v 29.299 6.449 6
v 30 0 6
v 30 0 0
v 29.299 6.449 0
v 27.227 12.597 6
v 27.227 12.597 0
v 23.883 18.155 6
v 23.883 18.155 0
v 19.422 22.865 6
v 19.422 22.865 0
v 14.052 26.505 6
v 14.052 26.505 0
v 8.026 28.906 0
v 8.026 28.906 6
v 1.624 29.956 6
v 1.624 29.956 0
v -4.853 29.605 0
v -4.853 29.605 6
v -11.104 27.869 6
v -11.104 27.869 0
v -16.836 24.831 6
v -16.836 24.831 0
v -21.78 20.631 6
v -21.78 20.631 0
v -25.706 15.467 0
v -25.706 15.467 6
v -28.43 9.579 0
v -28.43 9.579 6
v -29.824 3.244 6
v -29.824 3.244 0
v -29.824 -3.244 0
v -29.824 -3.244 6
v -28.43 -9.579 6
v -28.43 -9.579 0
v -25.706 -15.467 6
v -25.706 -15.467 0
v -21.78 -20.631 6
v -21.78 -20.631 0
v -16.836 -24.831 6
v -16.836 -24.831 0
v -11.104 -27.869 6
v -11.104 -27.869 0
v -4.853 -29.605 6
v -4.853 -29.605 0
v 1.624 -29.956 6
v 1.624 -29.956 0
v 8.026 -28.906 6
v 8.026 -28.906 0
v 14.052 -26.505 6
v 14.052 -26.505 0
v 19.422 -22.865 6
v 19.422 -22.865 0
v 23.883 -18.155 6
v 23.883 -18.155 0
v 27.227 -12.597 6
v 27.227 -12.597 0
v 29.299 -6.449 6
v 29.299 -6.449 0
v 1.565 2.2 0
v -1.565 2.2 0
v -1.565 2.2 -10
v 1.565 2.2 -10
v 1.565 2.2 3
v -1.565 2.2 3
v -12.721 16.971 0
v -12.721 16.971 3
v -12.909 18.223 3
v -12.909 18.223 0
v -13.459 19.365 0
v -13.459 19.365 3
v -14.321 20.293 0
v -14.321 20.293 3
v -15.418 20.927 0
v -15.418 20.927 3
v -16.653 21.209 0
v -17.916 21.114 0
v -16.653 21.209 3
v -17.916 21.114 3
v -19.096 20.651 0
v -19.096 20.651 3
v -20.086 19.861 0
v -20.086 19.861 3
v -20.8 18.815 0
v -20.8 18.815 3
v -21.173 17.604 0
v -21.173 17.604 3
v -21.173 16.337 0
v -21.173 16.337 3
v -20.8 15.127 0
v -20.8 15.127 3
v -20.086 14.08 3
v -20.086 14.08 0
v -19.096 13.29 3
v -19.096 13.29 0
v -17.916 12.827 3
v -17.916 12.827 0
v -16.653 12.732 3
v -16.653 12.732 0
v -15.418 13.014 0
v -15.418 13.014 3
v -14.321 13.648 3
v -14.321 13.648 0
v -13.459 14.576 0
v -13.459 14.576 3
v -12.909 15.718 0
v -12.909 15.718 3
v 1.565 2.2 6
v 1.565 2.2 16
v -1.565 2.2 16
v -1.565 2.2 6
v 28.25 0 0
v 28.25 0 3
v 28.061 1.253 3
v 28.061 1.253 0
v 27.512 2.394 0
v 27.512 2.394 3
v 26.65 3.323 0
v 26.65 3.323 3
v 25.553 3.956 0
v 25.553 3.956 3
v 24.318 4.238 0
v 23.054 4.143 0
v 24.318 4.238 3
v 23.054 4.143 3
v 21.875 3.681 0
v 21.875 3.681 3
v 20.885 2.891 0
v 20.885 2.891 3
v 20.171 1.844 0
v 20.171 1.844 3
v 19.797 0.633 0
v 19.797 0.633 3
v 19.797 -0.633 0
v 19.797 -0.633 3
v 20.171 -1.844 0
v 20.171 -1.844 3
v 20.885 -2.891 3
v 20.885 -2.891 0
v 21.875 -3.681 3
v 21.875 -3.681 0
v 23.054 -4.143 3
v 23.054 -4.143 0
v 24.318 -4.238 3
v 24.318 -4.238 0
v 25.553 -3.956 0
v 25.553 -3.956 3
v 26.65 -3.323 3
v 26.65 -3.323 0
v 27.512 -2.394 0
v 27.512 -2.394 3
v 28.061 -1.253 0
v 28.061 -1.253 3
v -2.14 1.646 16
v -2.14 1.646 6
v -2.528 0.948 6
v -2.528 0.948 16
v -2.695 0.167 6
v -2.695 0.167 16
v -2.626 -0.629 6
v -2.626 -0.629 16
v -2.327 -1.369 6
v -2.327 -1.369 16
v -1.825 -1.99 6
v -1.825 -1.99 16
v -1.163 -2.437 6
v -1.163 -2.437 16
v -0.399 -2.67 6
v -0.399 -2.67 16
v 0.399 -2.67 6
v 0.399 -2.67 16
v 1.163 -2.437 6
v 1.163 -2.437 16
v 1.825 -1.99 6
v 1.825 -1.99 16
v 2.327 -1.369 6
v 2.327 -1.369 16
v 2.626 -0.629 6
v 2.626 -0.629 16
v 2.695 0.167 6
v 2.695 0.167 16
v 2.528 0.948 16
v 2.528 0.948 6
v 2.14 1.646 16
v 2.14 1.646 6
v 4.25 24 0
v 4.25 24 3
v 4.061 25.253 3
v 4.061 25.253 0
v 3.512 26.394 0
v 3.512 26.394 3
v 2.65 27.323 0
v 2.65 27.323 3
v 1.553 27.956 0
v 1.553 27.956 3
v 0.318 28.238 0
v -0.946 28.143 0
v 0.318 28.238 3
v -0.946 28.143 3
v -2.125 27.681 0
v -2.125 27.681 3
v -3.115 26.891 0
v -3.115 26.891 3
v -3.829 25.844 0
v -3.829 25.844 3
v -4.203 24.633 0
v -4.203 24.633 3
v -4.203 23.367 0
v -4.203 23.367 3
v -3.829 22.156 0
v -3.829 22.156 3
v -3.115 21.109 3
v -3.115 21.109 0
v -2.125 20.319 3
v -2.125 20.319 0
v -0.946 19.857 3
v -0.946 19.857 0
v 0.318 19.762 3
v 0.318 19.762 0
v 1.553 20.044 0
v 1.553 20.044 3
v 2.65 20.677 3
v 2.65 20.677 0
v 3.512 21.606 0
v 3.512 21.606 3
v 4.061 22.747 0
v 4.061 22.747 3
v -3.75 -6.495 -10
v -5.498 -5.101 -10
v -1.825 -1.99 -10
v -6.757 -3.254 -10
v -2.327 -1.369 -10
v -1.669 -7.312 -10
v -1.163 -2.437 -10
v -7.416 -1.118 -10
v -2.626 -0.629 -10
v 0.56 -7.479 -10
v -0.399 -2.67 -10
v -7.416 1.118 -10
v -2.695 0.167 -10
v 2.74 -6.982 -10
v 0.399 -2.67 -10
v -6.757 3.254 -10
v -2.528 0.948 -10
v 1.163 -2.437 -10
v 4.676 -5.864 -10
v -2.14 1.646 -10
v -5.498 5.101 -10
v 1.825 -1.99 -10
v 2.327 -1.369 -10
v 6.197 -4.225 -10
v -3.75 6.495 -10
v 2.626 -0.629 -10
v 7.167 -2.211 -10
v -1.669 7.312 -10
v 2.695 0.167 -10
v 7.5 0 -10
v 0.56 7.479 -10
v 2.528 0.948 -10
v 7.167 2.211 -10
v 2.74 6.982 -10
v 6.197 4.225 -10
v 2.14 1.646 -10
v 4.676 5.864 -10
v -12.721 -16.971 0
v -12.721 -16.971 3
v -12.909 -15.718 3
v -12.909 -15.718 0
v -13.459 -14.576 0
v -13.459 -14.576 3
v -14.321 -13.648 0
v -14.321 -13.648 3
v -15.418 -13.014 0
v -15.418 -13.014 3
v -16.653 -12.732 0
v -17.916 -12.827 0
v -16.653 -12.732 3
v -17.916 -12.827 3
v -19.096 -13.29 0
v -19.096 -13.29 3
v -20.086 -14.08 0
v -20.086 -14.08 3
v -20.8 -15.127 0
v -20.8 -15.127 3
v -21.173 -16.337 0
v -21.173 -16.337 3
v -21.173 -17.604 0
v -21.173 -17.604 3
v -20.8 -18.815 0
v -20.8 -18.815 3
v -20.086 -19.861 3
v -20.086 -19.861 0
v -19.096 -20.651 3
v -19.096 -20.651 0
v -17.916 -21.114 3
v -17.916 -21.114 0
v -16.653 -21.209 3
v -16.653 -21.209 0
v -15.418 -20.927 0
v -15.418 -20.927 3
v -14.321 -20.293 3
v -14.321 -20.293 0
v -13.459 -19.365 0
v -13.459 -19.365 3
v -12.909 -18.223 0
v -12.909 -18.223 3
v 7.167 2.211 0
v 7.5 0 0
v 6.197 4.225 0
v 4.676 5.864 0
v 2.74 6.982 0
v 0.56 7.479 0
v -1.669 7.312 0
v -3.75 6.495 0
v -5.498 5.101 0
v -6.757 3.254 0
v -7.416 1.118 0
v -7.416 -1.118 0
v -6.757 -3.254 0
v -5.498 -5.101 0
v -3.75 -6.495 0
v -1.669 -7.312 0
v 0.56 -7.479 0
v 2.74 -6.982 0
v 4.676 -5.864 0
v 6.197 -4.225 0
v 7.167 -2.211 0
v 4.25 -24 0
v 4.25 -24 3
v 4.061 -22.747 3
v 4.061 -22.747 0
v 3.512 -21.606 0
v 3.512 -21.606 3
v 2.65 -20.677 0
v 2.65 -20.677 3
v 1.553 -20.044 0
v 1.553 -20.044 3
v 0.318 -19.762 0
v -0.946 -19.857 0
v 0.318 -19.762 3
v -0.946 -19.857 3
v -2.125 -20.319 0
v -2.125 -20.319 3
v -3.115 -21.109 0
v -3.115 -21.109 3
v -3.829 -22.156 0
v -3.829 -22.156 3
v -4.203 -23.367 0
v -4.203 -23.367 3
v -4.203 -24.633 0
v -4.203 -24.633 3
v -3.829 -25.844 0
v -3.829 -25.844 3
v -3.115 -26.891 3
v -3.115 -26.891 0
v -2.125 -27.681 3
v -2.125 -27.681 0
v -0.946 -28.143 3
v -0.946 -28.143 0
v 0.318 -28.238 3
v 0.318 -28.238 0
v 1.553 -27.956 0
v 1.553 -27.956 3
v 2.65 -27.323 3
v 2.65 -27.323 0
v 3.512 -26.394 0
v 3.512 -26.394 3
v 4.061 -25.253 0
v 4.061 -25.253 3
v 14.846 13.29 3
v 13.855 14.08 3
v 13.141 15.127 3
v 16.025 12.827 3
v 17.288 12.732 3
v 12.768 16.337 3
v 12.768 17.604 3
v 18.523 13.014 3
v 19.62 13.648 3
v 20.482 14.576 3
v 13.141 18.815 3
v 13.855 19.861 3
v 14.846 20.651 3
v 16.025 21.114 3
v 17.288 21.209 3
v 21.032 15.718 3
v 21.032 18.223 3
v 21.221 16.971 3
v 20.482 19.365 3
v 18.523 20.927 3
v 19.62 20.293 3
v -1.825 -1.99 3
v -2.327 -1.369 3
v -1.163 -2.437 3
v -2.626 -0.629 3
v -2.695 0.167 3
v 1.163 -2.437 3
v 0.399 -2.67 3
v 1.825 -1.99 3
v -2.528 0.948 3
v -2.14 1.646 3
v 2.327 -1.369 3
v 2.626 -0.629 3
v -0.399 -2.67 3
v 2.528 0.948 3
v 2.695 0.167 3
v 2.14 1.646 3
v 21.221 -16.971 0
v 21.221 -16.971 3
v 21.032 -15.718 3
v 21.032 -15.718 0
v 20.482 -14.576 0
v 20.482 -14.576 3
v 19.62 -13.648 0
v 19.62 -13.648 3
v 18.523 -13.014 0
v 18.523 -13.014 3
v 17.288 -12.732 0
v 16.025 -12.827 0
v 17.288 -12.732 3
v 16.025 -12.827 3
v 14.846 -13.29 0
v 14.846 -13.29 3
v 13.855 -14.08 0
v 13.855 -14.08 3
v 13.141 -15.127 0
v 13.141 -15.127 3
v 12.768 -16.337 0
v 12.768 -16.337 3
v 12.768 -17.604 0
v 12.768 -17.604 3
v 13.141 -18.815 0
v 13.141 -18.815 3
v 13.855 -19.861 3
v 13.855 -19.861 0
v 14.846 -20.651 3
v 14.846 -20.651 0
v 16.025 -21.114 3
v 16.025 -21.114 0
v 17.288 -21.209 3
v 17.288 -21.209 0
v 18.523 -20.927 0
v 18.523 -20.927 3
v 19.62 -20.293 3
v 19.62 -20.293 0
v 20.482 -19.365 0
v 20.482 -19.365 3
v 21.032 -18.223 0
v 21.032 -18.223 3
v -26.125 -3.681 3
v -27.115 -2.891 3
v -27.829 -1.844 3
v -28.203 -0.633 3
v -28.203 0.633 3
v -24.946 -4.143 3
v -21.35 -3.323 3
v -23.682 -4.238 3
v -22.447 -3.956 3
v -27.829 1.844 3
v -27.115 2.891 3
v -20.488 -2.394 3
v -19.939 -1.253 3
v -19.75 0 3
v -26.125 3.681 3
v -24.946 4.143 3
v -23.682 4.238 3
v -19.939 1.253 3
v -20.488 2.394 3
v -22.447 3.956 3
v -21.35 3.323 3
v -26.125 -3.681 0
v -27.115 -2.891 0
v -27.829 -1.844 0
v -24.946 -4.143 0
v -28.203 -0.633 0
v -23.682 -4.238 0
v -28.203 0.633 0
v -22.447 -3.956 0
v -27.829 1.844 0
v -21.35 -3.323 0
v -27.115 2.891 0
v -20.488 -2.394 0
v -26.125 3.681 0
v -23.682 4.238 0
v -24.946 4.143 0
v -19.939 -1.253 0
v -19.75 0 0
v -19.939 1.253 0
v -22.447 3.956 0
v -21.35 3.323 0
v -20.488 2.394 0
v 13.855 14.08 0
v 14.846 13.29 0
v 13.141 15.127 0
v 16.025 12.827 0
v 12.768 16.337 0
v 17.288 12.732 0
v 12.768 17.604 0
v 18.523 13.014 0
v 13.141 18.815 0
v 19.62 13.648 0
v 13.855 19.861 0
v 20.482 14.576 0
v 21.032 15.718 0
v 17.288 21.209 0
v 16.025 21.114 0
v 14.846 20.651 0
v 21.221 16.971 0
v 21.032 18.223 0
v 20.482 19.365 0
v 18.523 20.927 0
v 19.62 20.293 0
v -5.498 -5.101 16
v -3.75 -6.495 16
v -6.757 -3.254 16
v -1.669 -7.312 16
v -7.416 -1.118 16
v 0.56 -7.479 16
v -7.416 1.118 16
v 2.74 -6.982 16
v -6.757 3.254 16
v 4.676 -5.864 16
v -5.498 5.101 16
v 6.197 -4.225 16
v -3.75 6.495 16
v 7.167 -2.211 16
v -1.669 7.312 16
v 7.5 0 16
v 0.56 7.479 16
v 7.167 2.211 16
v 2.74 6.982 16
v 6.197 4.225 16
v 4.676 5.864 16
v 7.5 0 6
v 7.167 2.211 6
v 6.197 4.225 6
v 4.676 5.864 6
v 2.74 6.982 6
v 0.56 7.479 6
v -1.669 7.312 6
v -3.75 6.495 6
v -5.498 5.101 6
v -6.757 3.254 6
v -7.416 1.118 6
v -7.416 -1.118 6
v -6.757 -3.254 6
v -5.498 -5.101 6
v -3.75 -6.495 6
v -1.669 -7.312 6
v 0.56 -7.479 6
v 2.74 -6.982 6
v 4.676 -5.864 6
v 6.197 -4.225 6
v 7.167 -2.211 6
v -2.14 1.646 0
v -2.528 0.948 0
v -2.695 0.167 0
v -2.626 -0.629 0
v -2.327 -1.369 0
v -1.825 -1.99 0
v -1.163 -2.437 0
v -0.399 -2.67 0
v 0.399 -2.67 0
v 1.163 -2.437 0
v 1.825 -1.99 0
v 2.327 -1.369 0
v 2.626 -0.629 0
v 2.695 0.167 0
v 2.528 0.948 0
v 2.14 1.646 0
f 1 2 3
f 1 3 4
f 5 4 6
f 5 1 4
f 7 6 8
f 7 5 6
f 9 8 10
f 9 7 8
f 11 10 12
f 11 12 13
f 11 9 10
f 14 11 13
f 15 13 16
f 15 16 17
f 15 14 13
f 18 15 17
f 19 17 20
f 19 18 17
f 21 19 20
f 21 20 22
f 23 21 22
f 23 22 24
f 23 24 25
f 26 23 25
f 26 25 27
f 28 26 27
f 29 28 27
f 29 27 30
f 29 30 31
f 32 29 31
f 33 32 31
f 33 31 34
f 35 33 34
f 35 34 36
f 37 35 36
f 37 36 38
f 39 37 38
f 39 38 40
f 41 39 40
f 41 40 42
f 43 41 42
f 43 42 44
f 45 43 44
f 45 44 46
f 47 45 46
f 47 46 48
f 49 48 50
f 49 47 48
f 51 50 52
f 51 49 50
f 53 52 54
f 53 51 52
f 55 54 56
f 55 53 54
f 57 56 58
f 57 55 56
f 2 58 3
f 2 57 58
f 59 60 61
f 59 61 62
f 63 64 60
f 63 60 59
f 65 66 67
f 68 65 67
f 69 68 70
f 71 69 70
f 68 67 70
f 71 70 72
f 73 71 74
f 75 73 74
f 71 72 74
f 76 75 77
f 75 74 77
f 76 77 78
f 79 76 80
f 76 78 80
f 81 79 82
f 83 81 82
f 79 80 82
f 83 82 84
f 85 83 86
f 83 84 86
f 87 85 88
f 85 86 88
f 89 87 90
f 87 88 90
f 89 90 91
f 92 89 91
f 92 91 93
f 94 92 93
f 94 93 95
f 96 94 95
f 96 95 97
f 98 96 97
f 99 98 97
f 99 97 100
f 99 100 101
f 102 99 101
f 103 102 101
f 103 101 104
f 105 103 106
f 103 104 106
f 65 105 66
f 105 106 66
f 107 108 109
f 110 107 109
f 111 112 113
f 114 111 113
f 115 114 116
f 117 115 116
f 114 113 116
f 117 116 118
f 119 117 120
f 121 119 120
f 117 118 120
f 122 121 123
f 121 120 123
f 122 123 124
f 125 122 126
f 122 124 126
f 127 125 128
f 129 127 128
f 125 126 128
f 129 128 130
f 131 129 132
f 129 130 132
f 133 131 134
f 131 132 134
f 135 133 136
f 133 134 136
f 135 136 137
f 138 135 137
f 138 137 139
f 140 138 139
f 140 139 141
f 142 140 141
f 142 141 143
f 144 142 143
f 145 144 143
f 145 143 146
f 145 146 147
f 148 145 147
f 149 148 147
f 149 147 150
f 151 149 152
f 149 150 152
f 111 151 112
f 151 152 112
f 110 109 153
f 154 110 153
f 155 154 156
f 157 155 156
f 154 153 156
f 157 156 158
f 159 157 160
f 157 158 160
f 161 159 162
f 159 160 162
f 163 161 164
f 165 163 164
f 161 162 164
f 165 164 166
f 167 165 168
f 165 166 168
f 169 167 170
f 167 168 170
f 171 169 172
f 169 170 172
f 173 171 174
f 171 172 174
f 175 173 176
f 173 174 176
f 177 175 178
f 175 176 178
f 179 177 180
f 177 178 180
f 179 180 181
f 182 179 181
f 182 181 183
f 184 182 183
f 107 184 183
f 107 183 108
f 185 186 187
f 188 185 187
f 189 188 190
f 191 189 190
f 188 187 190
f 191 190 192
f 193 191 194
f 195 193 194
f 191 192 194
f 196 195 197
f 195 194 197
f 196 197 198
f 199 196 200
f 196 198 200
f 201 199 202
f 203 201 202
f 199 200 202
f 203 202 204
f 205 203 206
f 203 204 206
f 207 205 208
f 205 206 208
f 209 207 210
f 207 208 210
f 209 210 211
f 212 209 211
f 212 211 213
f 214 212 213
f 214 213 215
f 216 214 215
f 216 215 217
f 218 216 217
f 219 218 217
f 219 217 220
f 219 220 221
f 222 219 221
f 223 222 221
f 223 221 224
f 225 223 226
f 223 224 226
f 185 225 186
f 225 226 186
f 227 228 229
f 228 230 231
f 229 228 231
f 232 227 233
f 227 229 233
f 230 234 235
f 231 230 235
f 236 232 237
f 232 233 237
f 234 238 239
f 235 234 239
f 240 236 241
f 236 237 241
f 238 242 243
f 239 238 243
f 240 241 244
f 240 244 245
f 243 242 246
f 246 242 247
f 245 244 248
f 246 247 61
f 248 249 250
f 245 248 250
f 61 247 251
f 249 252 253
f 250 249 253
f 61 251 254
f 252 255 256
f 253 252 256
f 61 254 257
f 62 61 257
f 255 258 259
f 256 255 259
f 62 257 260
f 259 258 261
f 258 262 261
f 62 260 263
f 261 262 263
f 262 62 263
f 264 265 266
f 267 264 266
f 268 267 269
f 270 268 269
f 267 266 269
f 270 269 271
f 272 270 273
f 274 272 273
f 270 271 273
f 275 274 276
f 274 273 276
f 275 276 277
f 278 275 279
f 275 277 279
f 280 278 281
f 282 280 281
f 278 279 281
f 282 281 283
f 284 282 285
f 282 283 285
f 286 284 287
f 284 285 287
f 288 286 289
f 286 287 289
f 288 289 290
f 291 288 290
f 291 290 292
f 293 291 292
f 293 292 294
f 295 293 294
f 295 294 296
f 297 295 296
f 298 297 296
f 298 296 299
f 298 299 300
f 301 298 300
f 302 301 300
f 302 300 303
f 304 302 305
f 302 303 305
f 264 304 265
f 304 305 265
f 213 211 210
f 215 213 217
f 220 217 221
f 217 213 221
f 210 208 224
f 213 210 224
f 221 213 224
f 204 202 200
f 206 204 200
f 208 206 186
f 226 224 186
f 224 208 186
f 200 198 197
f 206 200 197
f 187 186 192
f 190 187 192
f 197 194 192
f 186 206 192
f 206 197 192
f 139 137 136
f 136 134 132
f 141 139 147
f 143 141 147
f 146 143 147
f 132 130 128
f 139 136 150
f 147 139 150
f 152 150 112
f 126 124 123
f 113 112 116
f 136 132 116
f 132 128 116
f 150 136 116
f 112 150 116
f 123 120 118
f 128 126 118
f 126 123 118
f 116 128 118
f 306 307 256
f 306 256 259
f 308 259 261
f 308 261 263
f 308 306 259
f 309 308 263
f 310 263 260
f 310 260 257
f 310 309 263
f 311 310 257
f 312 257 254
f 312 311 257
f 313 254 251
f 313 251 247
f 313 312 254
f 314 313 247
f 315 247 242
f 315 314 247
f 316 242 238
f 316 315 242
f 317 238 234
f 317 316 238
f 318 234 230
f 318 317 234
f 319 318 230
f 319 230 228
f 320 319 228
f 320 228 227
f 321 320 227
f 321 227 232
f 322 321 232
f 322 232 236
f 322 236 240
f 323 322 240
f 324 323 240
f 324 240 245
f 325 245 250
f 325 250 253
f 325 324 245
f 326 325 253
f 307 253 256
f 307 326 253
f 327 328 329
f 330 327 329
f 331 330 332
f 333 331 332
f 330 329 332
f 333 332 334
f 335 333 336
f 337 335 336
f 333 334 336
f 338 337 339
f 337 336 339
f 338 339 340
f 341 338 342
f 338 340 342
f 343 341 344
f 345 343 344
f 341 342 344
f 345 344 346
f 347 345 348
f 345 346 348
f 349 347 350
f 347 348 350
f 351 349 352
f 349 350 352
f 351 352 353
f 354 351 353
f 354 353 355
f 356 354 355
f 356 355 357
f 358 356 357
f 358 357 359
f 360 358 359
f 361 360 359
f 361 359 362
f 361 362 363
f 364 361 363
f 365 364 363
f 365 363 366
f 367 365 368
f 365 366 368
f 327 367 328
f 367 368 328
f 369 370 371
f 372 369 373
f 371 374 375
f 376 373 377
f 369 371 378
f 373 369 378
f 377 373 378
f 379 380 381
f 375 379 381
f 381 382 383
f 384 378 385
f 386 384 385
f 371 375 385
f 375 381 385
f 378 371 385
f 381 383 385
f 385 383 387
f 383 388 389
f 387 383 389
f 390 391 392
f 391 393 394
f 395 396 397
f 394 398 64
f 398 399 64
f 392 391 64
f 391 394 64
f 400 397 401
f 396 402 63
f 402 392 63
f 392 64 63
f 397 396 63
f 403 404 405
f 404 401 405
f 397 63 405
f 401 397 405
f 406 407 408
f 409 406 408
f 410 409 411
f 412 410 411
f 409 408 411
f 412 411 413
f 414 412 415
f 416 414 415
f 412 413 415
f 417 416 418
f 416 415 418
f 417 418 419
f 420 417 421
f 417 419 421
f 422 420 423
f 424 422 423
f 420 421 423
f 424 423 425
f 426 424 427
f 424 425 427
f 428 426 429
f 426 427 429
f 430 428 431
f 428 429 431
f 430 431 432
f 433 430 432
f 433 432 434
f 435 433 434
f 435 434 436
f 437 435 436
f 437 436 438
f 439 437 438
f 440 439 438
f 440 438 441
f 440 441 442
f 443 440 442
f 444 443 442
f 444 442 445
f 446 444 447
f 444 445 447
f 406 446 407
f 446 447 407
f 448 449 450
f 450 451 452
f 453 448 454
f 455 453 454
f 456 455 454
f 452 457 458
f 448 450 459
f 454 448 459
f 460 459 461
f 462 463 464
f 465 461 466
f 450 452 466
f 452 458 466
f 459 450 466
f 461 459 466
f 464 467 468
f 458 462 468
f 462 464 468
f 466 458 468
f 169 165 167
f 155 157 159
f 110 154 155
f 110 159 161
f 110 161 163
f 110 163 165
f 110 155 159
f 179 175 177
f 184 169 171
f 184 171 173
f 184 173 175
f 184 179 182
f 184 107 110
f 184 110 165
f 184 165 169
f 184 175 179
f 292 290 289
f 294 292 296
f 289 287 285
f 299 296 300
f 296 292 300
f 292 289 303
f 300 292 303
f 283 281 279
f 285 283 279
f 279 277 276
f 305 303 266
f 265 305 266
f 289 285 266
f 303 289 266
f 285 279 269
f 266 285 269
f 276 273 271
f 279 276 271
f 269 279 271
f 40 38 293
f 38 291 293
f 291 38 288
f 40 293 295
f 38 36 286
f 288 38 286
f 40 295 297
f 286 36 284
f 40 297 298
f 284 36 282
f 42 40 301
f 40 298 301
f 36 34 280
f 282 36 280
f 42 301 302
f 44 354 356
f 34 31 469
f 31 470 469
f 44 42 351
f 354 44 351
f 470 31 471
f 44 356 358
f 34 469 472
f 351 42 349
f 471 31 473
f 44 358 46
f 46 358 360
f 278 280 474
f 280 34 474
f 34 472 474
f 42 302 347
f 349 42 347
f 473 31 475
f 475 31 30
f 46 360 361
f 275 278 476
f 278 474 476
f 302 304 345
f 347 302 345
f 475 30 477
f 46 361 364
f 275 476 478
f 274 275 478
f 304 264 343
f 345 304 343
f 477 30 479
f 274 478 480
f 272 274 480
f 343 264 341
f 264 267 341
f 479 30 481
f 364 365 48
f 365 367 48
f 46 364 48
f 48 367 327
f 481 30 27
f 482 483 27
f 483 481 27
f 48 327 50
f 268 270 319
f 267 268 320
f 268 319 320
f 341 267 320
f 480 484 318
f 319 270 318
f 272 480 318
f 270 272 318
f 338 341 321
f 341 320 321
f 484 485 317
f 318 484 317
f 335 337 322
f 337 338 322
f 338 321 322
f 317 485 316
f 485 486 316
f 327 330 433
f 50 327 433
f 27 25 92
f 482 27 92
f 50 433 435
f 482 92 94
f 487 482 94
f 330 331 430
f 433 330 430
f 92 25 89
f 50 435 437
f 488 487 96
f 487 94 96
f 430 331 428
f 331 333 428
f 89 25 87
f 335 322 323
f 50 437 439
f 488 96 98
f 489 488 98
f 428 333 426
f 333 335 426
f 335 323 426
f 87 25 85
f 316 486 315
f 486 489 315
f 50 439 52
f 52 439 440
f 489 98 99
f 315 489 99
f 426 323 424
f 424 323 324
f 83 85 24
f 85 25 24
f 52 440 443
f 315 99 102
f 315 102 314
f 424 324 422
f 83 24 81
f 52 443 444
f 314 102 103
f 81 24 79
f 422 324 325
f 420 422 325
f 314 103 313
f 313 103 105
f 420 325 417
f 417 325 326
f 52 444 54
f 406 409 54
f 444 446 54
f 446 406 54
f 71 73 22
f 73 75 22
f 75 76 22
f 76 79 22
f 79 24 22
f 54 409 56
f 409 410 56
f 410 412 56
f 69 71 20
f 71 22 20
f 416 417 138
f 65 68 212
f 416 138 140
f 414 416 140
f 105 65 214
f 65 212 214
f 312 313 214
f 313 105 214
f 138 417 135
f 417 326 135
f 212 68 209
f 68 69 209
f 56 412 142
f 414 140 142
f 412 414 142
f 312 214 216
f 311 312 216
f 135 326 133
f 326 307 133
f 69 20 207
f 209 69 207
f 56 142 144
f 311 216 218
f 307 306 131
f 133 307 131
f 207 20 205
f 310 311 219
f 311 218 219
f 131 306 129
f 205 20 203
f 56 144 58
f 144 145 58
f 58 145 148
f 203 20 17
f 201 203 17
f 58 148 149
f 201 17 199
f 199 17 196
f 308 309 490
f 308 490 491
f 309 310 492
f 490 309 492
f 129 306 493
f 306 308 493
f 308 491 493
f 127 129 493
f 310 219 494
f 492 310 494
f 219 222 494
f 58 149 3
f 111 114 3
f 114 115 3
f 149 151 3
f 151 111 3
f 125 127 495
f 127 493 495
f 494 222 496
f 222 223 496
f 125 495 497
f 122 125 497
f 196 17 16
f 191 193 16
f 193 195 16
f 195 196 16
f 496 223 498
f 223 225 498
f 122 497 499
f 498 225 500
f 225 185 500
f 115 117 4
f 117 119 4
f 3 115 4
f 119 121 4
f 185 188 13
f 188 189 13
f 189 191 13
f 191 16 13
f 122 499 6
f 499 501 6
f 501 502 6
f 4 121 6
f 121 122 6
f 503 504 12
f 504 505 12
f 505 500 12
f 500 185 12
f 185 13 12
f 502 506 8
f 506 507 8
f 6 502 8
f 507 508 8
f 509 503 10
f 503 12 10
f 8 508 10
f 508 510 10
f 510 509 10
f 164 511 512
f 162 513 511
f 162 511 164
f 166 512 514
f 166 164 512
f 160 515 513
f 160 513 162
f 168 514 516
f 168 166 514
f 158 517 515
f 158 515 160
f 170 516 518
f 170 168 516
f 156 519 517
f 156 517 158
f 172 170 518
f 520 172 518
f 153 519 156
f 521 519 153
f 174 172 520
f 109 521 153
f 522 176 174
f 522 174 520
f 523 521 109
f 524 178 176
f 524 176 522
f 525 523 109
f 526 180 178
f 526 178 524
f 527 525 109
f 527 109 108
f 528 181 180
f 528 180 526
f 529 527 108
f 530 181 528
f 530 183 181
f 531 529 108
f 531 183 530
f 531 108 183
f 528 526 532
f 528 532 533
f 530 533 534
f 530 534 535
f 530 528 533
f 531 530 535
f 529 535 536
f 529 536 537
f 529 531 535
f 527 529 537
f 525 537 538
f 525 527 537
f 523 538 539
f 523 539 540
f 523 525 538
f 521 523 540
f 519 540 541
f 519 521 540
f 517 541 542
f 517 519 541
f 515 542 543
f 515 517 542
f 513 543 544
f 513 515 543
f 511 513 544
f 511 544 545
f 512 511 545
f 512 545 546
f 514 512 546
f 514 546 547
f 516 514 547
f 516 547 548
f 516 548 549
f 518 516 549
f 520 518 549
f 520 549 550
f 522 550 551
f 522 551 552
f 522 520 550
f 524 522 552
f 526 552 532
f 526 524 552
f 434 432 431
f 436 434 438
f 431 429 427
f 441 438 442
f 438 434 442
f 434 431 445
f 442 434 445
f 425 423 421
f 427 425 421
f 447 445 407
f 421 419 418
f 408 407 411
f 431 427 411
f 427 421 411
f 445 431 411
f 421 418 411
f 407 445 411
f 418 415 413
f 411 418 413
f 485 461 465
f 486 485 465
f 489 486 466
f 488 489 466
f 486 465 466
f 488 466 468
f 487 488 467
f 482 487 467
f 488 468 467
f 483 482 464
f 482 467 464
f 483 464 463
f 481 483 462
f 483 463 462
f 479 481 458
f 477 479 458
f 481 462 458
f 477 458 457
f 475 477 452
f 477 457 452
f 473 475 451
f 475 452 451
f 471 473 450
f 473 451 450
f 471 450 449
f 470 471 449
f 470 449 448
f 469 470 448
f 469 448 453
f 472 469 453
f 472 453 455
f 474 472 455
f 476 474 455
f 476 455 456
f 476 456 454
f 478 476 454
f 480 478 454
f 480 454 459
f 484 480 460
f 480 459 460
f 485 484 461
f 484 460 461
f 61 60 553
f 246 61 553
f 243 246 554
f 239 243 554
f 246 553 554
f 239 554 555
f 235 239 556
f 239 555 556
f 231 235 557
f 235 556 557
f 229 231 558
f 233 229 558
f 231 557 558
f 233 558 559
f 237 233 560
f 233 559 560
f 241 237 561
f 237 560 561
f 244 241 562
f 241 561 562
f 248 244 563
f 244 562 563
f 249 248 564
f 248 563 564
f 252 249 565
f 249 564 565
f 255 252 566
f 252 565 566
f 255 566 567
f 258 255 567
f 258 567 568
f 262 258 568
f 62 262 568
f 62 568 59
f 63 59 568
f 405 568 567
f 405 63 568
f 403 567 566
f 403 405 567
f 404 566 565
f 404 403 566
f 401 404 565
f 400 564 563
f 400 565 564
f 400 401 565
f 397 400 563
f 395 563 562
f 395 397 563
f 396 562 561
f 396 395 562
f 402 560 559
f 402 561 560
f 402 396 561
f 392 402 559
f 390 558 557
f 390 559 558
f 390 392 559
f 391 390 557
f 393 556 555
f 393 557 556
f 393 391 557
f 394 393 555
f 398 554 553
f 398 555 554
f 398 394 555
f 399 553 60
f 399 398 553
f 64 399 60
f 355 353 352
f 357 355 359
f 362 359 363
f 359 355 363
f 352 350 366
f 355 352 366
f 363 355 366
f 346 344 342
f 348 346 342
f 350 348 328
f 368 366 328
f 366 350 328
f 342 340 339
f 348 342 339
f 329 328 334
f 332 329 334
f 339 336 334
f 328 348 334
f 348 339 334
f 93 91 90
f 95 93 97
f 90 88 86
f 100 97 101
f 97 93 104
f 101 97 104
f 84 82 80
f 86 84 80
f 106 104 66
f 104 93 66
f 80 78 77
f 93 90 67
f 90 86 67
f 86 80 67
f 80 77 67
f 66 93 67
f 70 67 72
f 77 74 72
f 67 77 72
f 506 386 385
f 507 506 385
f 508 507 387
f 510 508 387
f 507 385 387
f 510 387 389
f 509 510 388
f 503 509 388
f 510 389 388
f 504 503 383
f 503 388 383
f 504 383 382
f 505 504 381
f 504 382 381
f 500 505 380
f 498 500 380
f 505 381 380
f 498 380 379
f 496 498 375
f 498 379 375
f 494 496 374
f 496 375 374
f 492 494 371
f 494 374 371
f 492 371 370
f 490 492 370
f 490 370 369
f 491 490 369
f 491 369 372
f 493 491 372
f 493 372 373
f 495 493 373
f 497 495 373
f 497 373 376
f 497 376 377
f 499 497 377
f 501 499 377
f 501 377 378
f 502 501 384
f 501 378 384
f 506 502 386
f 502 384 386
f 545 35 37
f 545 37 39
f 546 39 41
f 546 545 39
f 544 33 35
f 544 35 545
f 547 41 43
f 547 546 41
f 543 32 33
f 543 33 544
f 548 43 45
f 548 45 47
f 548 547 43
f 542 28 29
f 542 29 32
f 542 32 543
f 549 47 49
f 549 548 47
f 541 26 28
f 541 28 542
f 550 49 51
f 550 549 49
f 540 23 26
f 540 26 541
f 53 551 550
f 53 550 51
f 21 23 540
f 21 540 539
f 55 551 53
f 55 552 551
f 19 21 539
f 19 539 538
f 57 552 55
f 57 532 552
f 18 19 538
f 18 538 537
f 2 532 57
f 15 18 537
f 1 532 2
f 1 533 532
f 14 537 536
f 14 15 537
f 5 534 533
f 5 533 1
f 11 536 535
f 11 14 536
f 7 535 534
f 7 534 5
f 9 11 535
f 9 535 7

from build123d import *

# Parameters (mm, degrees)
SKETCH2_R           = 7.5
BOSS_EXTRUDE1_DEPTH = 10
BOSS_EXTRUDE3_START = 3
SKETCH4_R           = 30
SKETCH4_R_2         = 4.25
BOSS_EXTRUDE3_DEPTH = 3
BOSS_EXTRUDE4_START = 3
SKETCH5_R           = 30
BOSS_EXTRUDE4_DEPTH = 3
BOSS_EXTRUDE5_START = 10
SKETCH6_R           = 7.5
BOSS_EXTRUDE5_DEPTH = 10


with BuildPart() as part:
    # Sketch2 → Boss-Extrude1 (new body)
    with BuildSketch(Plane.XY):
        Circle(SKETCH2_R)
        with BuildLine():
            ThreePointArc((-1.565247584, 2.2), (0, -2.7), (1.565247584, 2.2))
            Line((1.565247584, 2.2), (-1.565247584, 2.2))
        make_face(mode=Mode.SUBTRACT)
    extrude(amount=-BOSS_EXTRUDE1_DEPTH)

    # Sketch4 → Boss-Extrude3 (add)
    with BuildSketch(Plane.XY.offset(BOSS_EXTRUDE3_START)):
        Circle(SKETCH4_R)
        with Locations((-16.970562748, -16.970562748)):
            Circle(SKETCH4_R_2, mode=Mode.SUBTRACT)
        with Locations((-24, 0)):
            Circle(SKETCH4_R_2, mode=Mode.SUBTRACT)
        with Locations((0, -24)):
            Circle(SKETCH4_R_2, mode=Mode.SUBTRACT)
        with Locations((16.970562748, -16.970562748)):
            Circle(SKETCH4_R_2, mode=Mode.SUBTRACT)
        with Locations((-16.970562748, 16.970562748)):
            Circle(SKETCH4_R_2, mode=Mode.SUBTRACT)
        with Locations((24, 0)):
            Circle(SKETCH4_R_2, mode=Mode.SUBTRACT)
        with Locations((0, 24)):
            Circle(SKETCH4_R_2, mode=Mode.SUBTRACT)
        with Locations((16.970562748, 16.970562748)):
            Circle(SKETCH4_R_2, mode=Mode.SUBTRACT)
        with BuildLine():
            ThreePointArc((1.565247584, 2.2), (0, -2.7), (-1.565247584, 2.2))
            Line((-1.565247584, 2.2), (1.565247584, 2.2))
        make_face(mode=Mode.SUBTRACT)
    extrude(amount=-BOSS_EXTRUDE3_DEPTH)

    # Sketch5 → Boss-Extrude4 (add)
    with BuildSketch(Plane.XY.offset(3).offset(BOSS_EXTRUDE4_START)):
        Circle(SKETCH5_R)
    extrude(amount=-BOSS_EXTRUDE4_DEPTH)

    # Sketch6 → Boss-Extrude5 (add)
    with BuildSketch(Plane.XY.offset(6).offset(BOSS_EXTRUDE5_START)):
        Circle(SKETCH6_R)
        with BuildLine():
            Line((1.565247584, 2.2), (-1.565247584, 2.2))
            ThreePointArc((-1.565247584, 2.2), (0, -2.7), (1.565247584, 2.2))
        make_face(mode=Mode.SUBTRACT)
    extrude(amount=-BOSS_EXTRUDE5_DEPTH)


solid = part.part
